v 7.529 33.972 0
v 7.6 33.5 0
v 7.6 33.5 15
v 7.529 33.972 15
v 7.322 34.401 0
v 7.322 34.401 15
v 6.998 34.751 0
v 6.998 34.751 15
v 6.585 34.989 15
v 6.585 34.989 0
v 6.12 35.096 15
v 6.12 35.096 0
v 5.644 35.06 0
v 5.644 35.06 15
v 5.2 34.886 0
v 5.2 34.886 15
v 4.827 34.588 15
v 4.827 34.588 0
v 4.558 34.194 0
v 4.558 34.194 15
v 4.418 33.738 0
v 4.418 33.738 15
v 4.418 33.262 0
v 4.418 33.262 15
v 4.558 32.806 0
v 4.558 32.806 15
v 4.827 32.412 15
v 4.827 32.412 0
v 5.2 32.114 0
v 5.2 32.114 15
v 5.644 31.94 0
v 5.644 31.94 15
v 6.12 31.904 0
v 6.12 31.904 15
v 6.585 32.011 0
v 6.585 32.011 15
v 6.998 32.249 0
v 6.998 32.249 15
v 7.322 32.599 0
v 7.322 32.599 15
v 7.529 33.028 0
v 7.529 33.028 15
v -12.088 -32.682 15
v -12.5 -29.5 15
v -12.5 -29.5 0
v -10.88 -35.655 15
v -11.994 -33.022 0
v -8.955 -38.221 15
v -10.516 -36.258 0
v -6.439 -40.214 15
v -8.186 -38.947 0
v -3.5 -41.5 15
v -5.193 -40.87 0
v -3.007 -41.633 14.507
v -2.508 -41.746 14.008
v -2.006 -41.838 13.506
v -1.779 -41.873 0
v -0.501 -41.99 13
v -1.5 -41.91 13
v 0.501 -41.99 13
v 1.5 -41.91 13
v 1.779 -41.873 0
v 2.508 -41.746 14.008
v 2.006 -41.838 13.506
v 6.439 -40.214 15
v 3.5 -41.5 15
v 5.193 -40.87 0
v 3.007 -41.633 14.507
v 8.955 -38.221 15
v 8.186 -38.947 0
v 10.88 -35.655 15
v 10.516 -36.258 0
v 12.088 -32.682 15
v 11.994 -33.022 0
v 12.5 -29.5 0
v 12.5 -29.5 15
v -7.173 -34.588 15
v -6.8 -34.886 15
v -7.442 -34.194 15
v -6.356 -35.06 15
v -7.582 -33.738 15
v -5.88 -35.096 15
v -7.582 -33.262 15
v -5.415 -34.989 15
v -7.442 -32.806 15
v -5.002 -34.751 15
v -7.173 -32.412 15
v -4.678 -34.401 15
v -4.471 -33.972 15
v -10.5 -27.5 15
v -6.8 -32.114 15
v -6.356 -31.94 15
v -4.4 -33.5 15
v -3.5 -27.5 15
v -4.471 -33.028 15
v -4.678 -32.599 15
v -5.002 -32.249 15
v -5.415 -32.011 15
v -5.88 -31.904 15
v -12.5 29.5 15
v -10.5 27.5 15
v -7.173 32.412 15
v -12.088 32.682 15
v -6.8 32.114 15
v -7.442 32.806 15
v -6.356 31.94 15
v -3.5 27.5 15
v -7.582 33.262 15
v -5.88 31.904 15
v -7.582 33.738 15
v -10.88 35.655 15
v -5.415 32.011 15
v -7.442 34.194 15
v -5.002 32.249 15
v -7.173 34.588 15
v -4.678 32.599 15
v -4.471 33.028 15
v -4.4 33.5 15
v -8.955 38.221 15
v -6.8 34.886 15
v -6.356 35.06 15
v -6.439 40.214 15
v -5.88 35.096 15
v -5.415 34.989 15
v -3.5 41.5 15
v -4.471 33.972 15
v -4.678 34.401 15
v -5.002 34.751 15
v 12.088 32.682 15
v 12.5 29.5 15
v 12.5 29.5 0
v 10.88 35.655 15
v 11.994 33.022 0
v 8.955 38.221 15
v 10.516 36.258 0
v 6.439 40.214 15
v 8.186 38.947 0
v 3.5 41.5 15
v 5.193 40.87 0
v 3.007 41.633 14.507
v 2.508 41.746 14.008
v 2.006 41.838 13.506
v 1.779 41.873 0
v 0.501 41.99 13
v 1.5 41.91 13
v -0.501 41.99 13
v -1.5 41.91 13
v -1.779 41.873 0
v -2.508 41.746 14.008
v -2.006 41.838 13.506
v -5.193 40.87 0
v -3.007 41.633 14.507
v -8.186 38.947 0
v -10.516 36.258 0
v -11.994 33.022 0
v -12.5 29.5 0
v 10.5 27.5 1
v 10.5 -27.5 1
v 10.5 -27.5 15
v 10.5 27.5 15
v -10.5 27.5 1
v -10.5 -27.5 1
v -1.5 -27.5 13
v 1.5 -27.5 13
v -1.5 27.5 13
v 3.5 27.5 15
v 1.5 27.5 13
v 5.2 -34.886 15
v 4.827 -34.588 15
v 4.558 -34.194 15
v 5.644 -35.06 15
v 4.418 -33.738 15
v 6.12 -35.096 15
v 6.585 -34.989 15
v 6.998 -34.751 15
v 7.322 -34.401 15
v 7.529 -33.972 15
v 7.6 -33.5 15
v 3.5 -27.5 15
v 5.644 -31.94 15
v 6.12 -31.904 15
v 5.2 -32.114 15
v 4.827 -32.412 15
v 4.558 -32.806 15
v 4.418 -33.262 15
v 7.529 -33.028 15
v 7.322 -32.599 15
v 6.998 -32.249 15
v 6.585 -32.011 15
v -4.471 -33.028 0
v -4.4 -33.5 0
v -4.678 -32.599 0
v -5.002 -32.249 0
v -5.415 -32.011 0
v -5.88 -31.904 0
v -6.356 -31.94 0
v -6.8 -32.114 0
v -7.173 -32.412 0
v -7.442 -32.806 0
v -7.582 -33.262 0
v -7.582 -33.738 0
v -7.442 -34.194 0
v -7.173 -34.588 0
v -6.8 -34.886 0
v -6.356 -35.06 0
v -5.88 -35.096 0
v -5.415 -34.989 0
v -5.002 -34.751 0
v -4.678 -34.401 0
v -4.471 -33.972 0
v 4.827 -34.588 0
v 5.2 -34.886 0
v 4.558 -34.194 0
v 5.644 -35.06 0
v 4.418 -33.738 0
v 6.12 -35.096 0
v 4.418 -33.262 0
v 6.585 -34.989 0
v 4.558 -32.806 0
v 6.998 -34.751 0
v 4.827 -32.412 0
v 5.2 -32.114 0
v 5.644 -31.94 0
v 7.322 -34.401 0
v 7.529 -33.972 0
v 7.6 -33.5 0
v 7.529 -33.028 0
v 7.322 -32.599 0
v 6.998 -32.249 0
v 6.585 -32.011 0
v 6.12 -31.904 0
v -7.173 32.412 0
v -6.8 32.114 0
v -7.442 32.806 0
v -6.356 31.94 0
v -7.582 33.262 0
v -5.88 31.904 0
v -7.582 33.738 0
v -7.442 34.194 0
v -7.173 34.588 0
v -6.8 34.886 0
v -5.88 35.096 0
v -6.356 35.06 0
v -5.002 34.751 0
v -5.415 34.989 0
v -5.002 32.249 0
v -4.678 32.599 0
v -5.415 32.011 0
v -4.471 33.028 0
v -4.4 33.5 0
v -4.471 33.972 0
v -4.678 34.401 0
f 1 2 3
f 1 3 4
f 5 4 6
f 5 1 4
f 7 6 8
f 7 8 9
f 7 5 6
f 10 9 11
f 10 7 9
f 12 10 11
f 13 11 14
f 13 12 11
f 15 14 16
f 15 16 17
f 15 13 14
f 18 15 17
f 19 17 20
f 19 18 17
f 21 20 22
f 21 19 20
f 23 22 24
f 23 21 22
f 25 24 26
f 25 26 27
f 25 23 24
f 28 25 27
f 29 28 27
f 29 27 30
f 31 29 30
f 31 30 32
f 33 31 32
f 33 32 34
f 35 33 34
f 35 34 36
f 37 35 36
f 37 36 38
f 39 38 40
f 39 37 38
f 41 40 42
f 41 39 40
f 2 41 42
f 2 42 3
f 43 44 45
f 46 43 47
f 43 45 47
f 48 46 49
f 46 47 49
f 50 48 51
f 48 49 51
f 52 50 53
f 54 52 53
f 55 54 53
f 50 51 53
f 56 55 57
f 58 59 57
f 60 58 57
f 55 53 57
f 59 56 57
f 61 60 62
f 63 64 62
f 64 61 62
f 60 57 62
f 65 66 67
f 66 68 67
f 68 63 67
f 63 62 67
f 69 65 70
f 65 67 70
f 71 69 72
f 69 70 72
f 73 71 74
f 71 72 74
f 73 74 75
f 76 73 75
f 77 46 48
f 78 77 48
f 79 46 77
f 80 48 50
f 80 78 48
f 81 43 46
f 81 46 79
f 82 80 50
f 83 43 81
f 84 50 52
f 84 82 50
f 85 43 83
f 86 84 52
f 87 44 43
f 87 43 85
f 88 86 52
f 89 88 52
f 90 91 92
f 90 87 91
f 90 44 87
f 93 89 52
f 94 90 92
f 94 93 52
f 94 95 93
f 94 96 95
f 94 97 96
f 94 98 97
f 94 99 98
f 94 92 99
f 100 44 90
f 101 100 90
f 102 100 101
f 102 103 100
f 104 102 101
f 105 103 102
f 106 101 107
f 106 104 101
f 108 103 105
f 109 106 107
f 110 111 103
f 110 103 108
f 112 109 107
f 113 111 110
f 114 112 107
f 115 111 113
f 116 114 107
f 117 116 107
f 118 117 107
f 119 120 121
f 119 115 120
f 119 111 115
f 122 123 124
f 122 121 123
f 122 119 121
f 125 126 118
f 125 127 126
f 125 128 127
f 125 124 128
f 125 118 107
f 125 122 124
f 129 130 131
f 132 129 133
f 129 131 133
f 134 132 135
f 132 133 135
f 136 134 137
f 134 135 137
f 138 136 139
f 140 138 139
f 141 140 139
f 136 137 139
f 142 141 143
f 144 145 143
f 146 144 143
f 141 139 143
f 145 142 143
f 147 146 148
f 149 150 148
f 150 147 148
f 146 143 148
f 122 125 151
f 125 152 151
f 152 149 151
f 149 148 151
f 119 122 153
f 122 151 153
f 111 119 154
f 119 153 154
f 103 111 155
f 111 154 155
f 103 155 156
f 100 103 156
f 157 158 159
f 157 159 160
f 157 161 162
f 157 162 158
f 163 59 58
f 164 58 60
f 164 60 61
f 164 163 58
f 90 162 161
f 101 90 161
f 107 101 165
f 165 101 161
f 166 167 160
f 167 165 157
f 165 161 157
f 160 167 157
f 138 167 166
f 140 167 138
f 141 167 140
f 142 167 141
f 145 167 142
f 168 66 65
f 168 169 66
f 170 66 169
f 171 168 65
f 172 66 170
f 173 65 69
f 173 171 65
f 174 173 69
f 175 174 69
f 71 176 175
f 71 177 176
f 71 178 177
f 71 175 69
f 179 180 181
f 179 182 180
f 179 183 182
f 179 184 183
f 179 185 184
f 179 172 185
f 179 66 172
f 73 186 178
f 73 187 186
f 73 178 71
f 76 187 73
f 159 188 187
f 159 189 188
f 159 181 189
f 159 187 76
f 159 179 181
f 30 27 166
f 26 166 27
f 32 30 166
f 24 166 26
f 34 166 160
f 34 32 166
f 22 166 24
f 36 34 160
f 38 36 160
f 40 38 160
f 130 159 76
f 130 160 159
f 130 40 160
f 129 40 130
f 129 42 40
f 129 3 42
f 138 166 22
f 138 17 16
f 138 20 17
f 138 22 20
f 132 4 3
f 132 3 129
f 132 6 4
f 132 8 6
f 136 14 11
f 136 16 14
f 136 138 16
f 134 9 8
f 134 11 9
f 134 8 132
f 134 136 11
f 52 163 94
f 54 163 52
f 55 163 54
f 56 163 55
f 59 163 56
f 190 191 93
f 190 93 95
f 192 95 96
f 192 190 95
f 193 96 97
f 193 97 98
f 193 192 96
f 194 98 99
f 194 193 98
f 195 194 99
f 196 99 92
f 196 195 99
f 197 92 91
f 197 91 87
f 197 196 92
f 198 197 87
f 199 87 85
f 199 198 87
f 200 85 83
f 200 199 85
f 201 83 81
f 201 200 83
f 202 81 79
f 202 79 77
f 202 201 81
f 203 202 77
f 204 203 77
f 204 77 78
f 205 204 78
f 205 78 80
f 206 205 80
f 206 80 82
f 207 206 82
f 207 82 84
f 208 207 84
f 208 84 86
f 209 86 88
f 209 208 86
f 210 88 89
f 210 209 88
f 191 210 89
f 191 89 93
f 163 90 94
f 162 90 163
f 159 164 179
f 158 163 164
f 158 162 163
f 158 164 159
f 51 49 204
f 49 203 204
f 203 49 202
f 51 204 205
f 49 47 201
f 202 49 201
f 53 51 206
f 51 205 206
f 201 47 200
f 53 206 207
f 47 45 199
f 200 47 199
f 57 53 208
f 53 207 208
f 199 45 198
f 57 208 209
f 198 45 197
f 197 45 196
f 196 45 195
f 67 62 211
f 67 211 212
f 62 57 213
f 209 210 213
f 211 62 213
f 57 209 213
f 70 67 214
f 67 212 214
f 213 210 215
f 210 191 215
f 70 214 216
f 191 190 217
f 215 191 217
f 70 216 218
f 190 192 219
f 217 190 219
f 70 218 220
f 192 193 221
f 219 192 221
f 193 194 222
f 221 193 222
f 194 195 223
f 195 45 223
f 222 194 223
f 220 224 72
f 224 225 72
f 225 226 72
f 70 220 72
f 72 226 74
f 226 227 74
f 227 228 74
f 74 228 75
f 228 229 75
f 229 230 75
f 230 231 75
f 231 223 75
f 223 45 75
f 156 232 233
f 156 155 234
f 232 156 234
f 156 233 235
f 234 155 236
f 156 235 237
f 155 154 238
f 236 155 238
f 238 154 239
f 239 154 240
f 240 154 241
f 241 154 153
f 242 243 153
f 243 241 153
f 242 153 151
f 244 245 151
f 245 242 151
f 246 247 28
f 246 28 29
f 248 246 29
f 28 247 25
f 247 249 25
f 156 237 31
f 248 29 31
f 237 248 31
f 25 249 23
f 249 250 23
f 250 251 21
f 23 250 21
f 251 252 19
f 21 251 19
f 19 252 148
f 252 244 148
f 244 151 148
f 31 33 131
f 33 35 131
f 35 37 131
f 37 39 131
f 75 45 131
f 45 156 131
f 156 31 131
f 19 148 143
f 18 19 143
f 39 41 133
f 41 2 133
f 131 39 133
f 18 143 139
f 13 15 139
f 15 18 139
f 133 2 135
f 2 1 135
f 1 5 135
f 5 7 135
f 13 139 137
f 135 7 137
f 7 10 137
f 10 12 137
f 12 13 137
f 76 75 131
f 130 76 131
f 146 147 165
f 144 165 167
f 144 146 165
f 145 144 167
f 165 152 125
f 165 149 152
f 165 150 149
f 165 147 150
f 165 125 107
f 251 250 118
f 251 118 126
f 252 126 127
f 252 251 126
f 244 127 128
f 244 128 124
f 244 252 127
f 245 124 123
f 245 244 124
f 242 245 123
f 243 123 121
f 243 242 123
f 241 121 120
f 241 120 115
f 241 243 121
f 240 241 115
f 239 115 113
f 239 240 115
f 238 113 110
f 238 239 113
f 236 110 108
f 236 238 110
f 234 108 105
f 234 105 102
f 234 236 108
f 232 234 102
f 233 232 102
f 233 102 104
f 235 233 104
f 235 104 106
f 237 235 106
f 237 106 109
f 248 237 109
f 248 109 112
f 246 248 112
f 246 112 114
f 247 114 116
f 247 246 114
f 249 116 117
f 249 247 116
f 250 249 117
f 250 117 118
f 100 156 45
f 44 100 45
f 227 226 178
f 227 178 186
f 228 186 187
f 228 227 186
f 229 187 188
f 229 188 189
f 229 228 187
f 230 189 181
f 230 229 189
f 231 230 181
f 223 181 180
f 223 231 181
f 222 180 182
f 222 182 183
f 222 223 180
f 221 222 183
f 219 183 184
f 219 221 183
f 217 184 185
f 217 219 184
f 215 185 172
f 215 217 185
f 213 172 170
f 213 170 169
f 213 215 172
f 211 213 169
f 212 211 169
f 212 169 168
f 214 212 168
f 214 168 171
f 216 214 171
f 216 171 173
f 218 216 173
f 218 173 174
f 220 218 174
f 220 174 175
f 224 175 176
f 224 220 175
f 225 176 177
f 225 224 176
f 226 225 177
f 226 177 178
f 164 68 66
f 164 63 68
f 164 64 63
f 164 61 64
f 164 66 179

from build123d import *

# Parameters (mm, degrees)
F0_R     = 1.6
F0_W     = 21
F0_H     = 55
F1_DEPTH = 15
F2_W     = 22.6258952171
F2_H     = 57.1813471615
F3_DEPTH = 1
F5_DEPTH = 2
F6_SIZE  = 1.99999


# Not quite as in the source:
# - a fillet or chamfer is up to 0.001 mm smaller than in the source, because OpenCascade refuses the exact size


with BuildPart() as f1:
    # F0 (on Top) → F1 (new body)
    with BuildSketch(Plane.XY):
        with BuildLine():
            Line((12.5, -29.5), (12.5, 29.5))
            ThreePointArc((12.5, 29.5), (0, 42), (-12.5, 29.5))
            Line((-12.5, 29.5), (-12.5, -29.5))
            ThreePointArc((-12.5, -29.5), (0, -42), (12.5, -29.5))
        make_face()
        with Locations((-6, -33.5)):
            Circle(F0_R, mode=Mode.SUBTRACT)
        with Locations((6, -33.5)):
            Circle(F0_R, mode=Mode.SUBTRACT)
        with Locations((-6, 33.5)):
            Circle(F0_R, mode=Mode.SUBTRACT)
        Rectangle(F0_W, F0_H, mode=Mode.SUBTRACT)
        with Locations((6, 33.5)):
            Circle(F0_R, mode=Mode.SUBTRACT)
    extrude(amount=F1_DEPTH)

    # F2 (on Top) → F3 (join)
    with BuildSketch(Plane.XY):
        Rectangle(F2_W, F2_H)
    extrude(amount=F3_DEPTH)

    # F4 (on face) → F5 (cut)
    with BuildSketch(Plane.XY.offset(15)):
        with BuildLine():
            ThreePointArc((1.5, 41.909673646), (0, 42), (-1.5, 41.909673646))
            Line((-1.5, 41.909673646), (-1.5, 27.5))
            Line((-1.5, 27.5), (1.5, 27.5))
            Line((1.5, 27.5), (1.5, 41.909673646))
        make_face()
        with BuildLine():
            Line((1.5, -27.5), (-1.5, -27.5))
            Line((-1.5, -27.5), (-1.5, -41.909673646))
            ThreePointArc((-1.5, -41.909673646), (0, -42), (1.5, -41.909673646))
            Line((1.5, -41.909673646), (1.5, -27.5))
        make_face()
    extrude(amount=-F5_DEPTH, mode=Mode.SUBTRACT)

    # F6 (size 2 in the source; OpenCascade refuses exactly that, so slightly less here)
    f6_edges = [f1.edges().sort_by_distance(p)[0] for p in [
        (-1.5, 34.704837, 15),
        (1.5, 34.704837, 15),
        (1.5, -34.704837, 15),
        (-1.5, -34.704837, 15),
    ]]
    chamfer(f6_edges, length=F6_SIZE)


solid = f1.part
